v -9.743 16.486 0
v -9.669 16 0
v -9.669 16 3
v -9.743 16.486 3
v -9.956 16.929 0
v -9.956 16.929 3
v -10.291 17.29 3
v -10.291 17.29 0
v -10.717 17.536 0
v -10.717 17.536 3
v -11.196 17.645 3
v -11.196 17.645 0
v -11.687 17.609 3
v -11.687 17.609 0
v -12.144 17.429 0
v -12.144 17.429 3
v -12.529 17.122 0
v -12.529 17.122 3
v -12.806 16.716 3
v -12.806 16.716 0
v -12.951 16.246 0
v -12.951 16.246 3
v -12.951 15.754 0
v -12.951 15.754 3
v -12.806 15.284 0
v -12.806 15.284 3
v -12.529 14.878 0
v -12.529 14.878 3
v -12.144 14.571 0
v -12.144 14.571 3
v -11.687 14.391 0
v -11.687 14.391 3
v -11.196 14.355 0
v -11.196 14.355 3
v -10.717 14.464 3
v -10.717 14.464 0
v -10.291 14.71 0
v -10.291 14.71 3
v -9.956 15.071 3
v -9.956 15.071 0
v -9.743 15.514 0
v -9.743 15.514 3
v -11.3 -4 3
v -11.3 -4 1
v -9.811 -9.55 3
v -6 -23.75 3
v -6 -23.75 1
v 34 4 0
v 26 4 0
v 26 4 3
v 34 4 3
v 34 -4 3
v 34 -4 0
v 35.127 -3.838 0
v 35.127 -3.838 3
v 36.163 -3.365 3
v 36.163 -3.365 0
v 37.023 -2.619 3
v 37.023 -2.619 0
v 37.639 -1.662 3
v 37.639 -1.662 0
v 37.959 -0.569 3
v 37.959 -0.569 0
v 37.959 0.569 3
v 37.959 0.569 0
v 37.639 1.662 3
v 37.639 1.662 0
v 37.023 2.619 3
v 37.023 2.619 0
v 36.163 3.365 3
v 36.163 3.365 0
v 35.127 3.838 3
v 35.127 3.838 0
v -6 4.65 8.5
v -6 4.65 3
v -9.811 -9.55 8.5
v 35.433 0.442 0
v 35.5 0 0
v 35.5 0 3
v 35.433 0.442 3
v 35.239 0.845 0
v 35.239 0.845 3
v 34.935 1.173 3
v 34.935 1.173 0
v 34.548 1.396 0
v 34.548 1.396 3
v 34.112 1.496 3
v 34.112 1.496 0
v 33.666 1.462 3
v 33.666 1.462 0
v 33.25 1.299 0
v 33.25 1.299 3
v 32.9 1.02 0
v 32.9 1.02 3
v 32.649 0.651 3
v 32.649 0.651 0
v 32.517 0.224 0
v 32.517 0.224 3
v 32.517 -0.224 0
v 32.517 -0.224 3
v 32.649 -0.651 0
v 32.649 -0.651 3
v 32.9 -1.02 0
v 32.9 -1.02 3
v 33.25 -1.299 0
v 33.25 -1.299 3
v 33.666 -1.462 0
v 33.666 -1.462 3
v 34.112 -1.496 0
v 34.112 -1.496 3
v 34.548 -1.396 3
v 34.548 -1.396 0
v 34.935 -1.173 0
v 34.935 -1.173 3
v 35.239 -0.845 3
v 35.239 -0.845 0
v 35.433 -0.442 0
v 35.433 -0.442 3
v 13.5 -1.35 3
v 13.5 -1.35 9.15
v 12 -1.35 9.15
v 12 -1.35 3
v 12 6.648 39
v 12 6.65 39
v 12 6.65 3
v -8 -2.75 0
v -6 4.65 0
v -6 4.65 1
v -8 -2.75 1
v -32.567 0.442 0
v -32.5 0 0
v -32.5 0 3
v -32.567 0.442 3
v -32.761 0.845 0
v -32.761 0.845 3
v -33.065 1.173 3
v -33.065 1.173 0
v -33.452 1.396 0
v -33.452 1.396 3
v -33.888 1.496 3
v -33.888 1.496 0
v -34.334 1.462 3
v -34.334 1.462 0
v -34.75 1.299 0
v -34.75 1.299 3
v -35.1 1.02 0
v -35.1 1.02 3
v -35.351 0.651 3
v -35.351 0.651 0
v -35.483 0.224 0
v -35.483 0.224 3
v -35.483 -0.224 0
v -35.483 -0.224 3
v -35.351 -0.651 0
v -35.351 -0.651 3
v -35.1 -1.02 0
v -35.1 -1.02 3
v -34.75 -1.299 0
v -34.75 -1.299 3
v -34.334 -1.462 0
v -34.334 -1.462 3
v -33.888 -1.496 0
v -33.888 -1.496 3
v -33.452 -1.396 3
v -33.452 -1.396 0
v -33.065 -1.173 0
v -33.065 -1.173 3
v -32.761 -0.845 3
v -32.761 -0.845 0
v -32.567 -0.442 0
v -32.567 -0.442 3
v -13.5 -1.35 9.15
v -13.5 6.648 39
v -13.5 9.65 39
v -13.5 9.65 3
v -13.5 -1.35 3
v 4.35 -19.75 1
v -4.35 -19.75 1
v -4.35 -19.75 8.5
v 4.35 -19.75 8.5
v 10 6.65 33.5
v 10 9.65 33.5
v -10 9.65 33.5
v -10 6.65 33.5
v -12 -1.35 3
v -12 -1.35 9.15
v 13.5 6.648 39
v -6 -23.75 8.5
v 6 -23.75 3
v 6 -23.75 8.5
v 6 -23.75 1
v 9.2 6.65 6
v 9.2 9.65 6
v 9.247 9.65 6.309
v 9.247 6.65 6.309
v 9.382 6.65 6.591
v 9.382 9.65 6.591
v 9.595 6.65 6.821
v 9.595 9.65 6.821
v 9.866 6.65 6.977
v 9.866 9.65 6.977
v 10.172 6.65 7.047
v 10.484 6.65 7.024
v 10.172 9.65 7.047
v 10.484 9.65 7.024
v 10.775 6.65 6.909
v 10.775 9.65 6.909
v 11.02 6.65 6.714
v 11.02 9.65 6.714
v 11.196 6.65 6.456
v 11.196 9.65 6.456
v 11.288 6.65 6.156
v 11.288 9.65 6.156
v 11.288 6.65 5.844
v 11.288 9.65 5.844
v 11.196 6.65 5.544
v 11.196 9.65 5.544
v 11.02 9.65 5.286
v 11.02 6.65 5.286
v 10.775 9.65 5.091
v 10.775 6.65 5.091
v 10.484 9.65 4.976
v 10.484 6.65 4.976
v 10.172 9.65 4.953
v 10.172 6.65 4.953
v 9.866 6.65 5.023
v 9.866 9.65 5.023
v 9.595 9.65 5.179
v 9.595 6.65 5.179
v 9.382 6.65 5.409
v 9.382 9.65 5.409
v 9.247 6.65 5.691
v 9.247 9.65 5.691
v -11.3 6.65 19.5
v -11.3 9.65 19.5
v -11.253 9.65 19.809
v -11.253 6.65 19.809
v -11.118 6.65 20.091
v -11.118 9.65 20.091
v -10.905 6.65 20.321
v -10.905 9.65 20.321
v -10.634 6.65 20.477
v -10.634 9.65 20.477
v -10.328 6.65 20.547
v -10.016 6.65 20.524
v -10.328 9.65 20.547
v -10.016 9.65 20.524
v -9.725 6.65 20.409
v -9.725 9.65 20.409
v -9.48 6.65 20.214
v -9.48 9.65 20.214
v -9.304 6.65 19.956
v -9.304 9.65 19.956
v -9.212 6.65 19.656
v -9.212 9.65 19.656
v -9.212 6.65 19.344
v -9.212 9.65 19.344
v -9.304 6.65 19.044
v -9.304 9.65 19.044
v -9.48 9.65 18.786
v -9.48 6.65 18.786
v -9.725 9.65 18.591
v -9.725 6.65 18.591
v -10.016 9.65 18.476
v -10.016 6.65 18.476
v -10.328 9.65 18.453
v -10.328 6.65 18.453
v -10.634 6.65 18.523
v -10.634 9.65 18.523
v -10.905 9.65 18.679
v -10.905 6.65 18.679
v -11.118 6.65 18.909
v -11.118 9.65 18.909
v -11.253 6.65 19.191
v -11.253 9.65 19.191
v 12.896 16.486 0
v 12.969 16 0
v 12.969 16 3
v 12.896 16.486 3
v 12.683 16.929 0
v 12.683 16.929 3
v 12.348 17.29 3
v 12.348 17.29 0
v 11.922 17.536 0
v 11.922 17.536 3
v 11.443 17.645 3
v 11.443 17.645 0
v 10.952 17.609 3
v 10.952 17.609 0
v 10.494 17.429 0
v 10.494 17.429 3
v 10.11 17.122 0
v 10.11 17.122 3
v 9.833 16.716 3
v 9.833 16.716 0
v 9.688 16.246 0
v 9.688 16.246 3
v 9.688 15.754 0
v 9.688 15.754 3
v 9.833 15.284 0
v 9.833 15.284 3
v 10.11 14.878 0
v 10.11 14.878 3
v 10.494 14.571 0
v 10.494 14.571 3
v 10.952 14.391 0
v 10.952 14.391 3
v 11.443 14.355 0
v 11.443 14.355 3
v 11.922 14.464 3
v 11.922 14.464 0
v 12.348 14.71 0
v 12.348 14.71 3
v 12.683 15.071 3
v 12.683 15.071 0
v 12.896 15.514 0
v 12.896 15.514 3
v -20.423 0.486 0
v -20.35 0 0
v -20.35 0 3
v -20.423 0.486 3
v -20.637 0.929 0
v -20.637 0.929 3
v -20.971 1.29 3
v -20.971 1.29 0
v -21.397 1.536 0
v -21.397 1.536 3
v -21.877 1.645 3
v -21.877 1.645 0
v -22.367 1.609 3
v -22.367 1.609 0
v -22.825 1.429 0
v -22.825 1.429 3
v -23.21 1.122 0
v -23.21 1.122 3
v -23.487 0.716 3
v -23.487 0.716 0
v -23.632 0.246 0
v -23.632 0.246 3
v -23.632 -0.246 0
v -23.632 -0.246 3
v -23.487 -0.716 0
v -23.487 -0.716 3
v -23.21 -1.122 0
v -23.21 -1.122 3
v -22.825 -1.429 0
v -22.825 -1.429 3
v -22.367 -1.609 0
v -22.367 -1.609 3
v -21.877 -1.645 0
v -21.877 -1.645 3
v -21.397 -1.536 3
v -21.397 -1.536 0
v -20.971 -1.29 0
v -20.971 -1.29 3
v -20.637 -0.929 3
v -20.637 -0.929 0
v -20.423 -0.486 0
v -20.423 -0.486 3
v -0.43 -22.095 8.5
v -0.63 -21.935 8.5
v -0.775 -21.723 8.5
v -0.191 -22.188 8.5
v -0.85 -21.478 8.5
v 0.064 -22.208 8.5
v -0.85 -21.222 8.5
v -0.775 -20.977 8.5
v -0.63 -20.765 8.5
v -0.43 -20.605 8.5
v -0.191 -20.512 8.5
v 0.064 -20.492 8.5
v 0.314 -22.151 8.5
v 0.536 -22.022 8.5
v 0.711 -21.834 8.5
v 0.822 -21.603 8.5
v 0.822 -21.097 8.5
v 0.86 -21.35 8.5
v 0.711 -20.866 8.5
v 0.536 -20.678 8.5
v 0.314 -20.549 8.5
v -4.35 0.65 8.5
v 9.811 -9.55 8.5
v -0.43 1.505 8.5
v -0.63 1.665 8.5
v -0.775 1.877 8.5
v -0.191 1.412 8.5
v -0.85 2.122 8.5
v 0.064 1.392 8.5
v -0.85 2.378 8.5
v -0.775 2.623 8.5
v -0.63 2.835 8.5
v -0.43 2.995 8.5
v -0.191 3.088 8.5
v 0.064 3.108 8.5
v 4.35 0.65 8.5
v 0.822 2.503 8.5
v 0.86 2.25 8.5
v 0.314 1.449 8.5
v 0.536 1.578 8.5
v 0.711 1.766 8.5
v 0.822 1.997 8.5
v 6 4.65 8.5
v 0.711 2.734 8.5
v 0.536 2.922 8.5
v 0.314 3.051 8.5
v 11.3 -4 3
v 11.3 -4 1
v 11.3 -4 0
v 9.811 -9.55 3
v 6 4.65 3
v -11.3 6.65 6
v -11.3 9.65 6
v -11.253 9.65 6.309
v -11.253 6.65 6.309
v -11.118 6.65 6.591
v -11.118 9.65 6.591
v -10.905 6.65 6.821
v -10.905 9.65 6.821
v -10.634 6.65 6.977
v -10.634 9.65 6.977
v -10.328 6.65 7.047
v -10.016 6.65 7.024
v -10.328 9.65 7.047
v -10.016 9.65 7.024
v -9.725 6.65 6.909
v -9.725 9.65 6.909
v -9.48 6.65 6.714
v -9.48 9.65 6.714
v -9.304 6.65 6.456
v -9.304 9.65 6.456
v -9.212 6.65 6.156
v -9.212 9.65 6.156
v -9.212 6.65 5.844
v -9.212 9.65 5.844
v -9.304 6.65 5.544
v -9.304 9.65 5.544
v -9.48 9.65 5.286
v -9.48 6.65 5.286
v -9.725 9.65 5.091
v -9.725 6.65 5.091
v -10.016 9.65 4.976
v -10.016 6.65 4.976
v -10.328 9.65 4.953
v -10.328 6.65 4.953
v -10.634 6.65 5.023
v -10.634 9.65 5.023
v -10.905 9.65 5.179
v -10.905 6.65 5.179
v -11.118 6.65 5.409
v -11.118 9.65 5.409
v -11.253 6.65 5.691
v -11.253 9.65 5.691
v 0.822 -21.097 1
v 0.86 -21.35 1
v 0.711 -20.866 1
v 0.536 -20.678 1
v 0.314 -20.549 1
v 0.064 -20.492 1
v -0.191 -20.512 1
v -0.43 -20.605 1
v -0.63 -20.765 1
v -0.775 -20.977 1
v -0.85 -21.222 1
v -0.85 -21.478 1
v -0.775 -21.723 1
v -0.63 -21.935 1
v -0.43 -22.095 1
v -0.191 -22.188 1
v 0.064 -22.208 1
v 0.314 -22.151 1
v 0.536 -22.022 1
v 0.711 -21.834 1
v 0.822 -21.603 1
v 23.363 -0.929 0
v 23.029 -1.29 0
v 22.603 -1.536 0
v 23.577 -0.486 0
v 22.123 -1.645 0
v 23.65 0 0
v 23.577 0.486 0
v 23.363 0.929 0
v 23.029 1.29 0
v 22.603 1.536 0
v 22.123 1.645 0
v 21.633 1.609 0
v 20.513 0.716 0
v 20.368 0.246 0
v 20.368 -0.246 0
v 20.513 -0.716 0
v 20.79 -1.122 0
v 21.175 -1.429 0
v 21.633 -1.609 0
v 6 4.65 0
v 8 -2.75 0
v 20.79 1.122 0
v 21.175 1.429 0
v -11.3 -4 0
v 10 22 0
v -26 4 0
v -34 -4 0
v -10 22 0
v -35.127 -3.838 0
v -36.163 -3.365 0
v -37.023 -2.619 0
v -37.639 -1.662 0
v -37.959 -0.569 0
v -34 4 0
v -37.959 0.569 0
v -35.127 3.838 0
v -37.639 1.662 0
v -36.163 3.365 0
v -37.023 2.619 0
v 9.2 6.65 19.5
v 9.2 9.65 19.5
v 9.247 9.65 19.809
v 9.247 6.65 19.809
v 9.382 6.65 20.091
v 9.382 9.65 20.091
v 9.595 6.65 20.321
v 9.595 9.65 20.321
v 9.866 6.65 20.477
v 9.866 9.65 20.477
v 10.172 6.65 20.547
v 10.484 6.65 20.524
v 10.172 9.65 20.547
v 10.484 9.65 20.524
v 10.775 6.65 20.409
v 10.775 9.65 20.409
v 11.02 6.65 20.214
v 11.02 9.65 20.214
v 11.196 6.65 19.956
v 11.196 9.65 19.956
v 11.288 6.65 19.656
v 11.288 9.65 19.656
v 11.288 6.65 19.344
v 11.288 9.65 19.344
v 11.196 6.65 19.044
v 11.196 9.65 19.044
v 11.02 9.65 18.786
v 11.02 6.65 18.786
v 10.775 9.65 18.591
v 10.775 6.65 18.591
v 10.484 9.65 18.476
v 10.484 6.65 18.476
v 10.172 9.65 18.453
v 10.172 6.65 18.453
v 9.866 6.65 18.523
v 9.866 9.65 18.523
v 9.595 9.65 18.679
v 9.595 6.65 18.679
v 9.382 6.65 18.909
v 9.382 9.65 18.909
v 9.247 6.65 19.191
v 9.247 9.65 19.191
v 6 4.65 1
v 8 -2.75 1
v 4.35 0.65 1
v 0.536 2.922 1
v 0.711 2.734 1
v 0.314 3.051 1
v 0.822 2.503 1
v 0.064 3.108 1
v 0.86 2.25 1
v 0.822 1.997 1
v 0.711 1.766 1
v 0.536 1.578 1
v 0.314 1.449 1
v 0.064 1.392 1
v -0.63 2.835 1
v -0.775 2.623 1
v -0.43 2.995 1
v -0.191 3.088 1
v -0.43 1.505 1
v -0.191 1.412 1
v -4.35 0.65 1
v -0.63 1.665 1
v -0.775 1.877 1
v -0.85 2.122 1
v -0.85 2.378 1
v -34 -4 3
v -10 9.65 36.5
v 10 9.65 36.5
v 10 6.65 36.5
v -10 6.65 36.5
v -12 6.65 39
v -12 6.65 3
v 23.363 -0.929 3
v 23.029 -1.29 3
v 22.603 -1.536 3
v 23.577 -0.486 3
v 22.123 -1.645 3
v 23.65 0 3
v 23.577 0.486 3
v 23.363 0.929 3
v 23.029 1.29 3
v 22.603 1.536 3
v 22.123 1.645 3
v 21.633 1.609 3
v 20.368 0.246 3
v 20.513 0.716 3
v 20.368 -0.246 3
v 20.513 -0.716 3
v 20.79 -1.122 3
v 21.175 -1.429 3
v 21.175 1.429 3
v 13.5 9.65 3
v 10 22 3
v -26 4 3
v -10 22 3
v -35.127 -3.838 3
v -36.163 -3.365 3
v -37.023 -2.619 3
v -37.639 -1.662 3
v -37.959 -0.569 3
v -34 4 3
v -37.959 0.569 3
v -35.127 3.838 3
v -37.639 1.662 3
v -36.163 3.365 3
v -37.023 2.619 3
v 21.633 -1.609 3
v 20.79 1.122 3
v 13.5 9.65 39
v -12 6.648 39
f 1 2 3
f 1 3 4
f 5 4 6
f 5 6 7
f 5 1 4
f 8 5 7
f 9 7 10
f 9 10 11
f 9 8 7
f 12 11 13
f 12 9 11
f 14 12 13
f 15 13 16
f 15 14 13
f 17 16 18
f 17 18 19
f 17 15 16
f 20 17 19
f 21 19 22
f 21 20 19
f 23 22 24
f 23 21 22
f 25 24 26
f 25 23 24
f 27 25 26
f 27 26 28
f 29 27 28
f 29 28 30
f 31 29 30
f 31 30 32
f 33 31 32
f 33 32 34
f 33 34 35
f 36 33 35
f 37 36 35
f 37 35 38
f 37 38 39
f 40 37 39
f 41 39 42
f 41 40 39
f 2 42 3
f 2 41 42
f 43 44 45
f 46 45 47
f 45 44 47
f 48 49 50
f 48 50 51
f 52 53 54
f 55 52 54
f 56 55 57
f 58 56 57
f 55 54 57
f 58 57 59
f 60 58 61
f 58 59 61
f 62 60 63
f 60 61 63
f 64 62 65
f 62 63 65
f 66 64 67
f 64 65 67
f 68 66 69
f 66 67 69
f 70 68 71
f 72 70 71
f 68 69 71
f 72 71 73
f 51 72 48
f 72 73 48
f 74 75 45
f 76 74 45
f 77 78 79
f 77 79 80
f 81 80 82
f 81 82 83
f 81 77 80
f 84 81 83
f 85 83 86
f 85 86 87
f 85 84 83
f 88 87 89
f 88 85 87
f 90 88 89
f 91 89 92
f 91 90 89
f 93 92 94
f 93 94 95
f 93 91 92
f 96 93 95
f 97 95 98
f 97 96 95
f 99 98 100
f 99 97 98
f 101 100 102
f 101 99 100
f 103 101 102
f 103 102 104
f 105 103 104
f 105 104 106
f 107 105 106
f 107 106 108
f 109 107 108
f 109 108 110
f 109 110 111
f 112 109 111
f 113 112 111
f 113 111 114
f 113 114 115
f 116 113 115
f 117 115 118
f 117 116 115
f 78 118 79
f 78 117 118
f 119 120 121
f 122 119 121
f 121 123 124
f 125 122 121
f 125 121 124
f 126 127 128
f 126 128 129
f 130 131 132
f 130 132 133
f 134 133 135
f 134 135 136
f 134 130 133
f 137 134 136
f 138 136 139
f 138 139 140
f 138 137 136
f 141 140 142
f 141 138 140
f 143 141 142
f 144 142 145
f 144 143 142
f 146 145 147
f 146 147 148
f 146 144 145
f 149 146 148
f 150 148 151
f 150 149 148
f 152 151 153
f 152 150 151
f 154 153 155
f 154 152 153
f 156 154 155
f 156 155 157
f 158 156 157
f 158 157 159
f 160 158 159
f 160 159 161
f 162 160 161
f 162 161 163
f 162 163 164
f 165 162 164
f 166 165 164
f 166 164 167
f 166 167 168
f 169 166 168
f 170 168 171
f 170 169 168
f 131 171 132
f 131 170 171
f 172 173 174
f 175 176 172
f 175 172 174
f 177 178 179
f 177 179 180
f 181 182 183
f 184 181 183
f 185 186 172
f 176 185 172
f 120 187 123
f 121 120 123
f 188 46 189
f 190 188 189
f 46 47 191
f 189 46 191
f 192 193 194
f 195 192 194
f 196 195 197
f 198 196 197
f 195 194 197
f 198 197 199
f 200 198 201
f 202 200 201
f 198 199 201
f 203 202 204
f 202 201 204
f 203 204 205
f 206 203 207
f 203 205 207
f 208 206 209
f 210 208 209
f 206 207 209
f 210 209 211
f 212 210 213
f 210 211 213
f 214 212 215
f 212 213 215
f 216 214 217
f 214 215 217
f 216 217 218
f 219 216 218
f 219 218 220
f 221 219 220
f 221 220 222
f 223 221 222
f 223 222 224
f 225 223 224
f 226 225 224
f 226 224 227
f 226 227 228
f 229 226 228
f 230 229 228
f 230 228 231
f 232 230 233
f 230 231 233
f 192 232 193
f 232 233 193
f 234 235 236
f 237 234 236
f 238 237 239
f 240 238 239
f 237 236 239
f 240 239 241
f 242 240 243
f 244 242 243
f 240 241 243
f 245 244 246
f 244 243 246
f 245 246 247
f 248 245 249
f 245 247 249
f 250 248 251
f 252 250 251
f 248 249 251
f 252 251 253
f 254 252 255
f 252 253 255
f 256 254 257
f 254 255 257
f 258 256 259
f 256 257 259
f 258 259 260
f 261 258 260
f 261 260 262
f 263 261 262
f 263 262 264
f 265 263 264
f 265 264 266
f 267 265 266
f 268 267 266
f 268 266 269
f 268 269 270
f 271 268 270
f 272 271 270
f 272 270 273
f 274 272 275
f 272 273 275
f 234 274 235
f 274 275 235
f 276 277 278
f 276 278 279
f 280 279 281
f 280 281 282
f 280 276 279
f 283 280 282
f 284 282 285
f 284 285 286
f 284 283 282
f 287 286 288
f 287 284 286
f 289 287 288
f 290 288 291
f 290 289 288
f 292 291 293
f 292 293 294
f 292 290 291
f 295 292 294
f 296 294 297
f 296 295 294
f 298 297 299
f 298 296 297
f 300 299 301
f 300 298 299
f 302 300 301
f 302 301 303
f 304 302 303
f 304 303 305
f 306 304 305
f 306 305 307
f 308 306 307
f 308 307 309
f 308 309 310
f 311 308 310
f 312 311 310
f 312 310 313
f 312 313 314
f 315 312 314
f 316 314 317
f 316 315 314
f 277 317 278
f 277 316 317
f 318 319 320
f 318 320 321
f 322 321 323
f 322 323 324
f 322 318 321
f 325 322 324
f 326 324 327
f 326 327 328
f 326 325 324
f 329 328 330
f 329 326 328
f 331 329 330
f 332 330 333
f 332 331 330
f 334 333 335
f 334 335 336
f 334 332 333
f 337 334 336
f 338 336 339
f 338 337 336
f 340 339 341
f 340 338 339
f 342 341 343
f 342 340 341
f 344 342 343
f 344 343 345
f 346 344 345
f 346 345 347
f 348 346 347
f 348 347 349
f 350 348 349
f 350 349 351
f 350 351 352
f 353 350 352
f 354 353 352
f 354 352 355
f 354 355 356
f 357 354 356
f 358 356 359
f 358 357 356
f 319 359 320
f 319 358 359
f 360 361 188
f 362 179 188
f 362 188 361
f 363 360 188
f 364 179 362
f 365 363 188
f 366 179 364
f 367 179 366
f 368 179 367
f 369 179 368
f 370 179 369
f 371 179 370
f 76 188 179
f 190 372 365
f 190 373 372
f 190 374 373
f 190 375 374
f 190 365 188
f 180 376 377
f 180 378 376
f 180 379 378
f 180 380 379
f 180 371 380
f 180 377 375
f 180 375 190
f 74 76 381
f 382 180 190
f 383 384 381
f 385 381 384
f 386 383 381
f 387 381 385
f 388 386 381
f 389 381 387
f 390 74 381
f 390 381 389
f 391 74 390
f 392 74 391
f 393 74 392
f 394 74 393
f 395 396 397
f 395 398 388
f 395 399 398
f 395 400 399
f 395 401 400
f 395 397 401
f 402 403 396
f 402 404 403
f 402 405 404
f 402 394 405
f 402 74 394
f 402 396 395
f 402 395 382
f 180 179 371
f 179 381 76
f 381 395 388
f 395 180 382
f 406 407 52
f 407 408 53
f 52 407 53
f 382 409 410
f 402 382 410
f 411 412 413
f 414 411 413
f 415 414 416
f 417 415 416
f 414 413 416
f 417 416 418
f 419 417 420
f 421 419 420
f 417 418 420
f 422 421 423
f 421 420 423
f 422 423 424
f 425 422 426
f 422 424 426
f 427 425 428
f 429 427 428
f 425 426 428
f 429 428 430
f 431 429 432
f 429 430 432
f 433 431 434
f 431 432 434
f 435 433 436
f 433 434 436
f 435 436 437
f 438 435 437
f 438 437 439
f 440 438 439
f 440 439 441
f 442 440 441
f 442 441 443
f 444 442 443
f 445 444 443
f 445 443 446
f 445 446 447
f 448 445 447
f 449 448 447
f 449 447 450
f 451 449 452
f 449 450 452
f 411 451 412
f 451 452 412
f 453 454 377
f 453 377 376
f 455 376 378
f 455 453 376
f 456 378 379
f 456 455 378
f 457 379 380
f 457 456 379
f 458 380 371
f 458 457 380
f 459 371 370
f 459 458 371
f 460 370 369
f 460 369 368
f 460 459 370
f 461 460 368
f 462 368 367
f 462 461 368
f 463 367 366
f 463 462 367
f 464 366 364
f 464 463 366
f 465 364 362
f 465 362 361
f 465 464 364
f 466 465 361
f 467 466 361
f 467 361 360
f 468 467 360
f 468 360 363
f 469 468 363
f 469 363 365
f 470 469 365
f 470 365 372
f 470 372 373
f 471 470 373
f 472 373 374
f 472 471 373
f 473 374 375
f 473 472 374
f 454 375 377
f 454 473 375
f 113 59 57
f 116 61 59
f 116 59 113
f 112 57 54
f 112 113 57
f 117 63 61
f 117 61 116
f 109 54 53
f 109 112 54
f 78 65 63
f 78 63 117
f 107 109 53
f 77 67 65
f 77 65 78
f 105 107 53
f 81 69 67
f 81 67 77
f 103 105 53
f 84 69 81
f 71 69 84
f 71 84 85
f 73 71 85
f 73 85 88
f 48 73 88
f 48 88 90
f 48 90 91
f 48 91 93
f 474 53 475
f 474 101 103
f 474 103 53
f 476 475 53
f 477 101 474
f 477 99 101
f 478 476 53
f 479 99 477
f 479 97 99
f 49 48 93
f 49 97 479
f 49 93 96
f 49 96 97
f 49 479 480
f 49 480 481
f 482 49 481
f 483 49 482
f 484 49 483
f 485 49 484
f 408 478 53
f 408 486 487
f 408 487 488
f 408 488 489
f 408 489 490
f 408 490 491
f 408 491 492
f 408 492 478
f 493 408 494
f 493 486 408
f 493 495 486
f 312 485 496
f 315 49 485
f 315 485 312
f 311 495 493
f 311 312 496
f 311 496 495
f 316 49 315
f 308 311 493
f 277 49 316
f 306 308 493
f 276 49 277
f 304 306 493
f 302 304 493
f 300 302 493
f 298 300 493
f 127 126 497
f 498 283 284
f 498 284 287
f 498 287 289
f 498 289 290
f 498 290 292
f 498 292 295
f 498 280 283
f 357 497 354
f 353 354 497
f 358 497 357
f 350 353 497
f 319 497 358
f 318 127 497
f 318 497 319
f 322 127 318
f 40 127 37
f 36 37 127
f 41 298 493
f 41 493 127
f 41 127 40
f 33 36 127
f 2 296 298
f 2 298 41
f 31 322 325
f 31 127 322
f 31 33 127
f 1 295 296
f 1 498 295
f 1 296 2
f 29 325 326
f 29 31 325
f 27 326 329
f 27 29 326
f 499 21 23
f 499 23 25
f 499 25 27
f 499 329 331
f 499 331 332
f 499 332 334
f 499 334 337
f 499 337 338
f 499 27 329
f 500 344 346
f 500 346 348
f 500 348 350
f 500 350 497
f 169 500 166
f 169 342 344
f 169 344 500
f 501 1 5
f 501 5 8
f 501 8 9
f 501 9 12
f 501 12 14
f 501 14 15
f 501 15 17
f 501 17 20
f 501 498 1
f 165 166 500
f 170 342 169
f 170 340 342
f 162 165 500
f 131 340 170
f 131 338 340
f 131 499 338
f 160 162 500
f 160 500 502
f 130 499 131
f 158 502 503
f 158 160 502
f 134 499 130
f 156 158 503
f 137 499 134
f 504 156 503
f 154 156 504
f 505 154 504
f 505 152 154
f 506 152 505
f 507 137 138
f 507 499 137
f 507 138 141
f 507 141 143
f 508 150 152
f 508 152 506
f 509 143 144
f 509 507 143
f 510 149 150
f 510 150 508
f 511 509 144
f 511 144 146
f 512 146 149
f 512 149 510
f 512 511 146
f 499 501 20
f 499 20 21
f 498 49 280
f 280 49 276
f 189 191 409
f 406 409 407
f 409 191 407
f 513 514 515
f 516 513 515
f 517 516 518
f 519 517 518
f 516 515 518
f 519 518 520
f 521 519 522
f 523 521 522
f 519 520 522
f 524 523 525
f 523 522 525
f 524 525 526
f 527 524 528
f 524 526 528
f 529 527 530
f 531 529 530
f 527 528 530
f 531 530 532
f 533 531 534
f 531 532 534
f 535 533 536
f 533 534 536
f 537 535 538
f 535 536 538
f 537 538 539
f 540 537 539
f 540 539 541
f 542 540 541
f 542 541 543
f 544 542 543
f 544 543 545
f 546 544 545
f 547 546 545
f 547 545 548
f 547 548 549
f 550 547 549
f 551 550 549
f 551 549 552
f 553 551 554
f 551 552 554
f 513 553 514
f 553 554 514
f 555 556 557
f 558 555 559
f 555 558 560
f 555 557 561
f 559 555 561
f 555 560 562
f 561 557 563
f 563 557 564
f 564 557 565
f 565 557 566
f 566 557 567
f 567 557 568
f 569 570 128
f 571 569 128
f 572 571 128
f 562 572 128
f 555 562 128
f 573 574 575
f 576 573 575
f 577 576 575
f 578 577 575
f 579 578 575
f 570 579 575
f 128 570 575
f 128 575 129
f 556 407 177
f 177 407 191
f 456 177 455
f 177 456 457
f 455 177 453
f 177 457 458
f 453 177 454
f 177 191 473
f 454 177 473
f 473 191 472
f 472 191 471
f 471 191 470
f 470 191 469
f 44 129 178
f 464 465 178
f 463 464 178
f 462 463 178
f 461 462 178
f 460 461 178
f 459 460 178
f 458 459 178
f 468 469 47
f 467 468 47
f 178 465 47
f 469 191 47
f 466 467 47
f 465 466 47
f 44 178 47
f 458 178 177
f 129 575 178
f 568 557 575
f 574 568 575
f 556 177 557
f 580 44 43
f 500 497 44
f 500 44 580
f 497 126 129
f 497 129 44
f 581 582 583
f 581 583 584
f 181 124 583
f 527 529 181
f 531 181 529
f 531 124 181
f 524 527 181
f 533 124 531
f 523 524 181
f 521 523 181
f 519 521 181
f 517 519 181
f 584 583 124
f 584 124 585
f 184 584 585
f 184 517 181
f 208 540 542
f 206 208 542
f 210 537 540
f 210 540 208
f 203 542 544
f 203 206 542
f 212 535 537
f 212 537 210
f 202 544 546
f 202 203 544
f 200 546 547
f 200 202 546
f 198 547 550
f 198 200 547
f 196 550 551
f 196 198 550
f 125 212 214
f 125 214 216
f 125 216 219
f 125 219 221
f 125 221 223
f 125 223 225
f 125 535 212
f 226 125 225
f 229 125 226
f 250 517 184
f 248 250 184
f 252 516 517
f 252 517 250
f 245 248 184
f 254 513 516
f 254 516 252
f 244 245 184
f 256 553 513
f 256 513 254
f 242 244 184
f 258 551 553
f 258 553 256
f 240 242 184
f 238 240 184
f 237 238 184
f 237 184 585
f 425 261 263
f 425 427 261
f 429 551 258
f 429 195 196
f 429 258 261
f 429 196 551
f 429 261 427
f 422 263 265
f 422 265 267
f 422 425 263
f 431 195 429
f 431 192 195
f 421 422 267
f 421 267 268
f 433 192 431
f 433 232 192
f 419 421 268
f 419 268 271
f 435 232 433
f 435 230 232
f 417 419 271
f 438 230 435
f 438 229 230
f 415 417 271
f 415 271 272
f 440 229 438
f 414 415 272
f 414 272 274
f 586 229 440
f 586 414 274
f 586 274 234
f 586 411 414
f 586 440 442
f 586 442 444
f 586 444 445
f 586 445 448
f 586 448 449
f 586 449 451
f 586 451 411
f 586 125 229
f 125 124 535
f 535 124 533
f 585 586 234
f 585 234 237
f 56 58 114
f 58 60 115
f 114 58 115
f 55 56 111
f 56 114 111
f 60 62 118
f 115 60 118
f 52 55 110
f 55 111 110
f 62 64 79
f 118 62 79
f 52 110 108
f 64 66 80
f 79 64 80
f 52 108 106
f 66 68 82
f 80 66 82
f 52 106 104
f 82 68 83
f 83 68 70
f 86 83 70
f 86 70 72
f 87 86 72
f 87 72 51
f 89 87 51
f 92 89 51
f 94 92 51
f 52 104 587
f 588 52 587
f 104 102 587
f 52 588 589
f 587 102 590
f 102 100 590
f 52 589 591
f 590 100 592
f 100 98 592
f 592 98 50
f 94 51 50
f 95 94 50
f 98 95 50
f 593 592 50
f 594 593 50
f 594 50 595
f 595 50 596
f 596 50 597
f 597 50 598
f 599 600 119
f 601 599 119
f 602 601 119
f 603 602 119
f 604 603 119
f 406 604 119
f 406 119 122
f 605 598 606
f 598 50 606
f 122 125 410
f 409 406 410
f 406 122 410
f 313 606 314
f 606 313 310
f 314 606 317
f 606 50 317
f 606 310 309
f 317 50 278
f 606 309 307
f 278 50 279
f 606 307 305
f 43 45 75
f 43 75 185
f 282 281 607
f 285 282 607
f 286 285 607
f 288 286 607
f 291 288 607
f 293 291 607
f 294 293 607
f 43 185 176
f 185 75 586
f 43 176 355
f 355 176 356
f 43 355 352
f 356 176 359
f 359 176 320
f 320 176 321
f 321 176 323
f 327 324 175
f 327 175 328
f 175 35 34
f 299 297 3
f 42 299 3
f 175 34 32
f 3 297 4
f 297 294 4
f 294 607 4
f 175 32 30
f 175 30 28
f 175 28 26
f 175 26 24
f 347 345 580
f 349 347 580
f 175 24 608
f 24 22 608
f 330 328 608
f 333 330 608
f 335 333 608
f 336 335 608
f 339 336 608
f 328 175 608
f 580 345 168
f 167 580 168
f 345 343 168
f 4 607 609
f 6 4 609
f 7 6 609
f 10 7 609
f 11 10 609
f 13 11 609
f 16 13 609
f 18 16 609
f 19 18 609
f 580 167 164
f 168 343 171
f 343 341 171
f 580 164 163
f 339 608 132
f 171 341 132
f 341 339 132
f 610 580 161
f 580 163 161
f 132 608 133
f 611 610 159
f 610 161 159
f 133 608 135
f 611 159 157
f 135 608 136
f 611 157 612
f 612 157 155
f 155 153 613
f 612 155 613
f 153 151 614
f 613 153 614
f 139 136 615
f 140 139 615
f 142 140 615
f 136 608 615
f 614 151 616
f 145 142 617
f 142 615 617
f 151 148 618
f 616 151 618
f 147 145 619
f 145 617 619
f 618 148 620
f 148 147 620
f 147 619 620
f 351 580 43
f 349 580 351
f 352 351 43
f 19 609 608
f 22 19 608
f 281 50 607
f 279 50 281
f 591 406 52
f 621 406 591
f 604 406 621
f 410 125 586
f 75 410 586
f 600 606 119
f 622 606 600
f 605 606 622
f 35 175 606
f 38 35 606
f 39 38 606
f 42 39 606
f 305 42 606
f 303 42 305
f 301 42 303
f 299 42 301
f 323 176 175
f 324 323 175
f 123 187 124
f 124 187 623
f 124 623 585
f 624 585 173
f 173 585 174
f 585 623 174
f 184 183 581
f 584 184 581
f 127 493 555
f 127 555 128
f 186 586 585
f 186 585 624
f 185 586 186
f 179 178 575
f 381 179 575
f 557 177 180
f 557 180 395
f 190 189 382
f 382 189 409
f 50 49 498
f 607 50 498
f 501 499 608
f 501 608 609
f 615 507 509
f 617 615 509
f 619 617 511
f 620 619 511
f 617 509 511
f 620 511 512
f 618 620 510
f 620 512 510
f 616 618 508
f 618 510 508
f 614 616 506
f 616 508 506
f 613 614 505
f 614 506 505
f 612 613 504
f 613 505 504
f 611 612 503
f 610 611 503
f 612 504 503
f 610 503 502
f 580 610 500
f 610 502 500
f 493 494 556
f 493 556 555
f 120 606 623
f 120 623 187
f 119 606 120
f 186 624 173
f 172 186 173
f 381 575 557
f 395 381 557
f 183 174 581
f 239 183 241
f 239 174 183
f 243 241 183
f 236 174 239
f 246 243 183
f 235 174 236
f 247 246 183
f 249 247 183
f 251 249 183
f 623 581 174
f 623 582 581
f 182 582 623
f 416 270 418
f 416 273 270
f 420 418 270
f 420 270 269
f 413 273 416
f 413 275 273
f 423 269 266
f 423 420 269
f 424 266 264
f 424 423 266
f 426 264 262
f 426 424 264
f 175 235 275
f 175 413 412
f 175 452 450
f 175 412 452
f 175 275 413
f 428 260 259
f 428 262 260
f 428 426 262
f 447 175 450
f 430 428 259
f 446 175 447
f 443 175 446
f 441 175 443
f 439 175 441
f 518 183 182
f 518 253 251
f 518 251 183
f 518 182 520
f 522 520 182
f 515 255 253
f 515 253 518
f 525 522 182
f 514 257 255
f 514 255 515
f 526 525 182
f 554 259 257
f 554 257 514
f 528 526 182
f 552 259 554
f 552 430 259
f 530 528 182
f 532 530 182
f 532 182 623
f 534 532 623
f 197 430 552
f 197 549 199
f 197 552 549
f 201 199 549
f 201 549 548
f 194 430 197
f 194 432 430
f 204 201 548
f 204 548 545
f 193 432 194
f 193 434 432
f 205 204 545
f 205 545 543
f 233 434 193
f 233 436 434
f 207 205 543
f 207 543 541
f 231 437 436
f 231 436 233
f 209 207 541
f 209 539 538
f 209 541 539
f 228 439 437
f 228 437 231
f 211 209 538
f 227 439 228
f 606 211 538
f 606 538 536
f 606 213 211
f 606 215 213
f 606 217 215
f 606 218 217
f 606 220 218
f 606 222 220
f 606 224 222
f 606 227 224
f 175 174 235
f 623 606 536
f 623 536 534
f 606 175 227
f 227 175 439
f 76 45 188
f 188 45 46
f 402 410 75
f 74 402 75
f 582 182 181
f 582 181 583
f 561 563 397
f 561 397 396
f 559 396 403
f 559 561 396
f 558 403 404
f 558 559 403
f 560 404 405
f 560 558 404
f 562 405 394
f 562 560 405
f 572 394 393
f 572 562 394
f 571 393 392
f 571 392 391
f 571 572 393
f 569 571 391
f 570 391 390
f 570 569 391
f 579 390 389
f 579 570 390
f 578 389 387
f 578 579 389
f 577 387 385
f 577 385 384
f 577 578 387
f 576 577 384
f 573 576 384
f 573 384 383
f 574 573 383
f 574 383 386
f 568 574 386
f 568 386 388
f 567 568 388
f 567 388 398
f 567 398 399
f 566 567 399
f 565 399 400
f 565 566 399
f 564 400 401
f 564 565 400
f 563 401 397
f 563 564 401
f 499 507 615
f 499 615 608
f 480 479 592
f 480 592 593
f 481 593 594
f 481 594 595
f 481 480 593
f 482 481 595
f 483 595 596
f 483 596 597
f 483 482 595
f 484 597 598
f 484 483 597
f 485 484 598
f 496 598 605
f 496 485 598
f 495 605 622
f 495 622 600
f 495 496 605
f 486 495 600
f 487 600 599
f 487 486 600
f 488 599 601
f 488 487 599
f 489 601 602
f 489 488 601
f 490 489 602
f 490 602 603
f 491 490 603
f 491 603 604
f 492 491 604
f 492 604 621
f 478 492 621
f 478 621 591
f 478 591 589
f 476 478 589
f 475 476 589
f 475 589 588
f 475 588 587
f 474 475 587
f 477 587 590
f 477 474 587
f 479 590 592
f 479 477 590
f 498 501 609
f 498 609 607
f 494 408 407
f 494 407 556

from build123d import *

# Parameters (mm, degrees)
SKETCH_R        = 0.86
SKETCH_R_2      = 1.5
SKETCH_R_3      = 1.65
SKETCH_W        = 8.7
SKETCH_H        = 20.4
PAD_DEPTH       = 3
SKETCH001_R     = 0.86
SKETCH001_W     = 8.7
SKETCH001_H     = 20.4
PAD001_DEPTH    = 5.5
PAD002_DEPTH    = 36
CHAMFER_1_ANGLE = 15
CHAMFER_1_SIZE  = 29.85
CHAMFER_2_ANGLE = 15
CHAMFER_2_SIZE  = 29.85
SKETCH003_R     = 1.05
SKETCH003_W     = 20
SKETCH003_H     = 3
POCKET_DEPTH    = 3
POCKET001_DEPTH = 1


with BuildPart() as part:
    # Sketch → Pad (new body)
    with BuildSketch(Plane.XY):
        with BuildLine():
            Line((-11.3, -4), (-26, -4))
            Line((-26, -4), (-34, -4))
            ThreePointArc((-34, 4), (-38, 0), (-34, -4))
            Line((-34, 4), (-26, 4))
            Line((-26, 4), (-10, 22))
            Line((-10, 22), (10, 22))
            Line((26, 4), (10, 22))
            Line((26, 4), (34, 4))
            ThreePointArc((34, -4), (38, 0), (34, 4))
            Line((26, -4), (34, -4))
            Line((11.3, -4), (26, -4))
            Line((6, -23.75), (11.3, -4))
            Line((-6, -23.75), (6, -23.75))
            Line((-11.3, -4), (-6, -23.75))
        make_face()
        with Locations((0, 2.25)):
            Circle(SKETCH_R, mode=Mode.SUBTRACT)
        with Locations((0, -21.35)):
            Circle(SKETCH_R, mode=Mode.SUBTRACT)
        with Locations((-34, 0)):
            Circle(SKETCH_R_2, mode=Mode.SUBTRACT)
        with Locations((34, 0)):
            Circle(SKETCH_R_2, mode=Mode.SUBTRACT)
        with Locations((-22, 0)):
            Circle(SKETCH_R_3, mode=Mode.SUBTRACT)
        with Locations((-11.319468, 16)):
            Circle(SKETCH_R_3, mode=Mode.SUBTRACT)
        with Locations((11.319468, 16)):
            Circle(SKETCH_R_3, mode=Mode.SUBTRACT)
        with Locations((22, 0)):
            Circle(SKETCH_R_3, mode=Mode.SUBTRACT)
        with Locations((0, -9.55)):
            Rectangle(SKETCH_W, SKETCH_H, mode=Mode.SUBTRACT)
    extrude(amount=PAD_DEPTH)

    # Sketch001 (on Face24 of Pad) → Pad001 (join)
    with BuildSketch(Plane.XY.offset(3)):
        Polygon((-6, -23.75), (6, -23.75), (9.810633, -9.55), (6, 4.65), (-6, 4.65), (-9.810633, -9.55), align=None)
        with Locations((0, -21.35)):
            Circle(SKETCH001_R, mode=Mode.SUBTRACT)
        with Locations((0, 2.25)):
            Circle(SKETCH001_R, mode=Mode.SUBTRACT)
        with Locations((0, -9.55)):
            Rectangle(SKETCH001_W, SKETCH001_H, mode=Mode.SUBTRACT)
    extrude(amount=PAD001_DEPTH)

    # Sketch002 (on Face5 of Pad001) → Pad002 (join)
    with BuildSketch(Plane.XY.offset(3)):
        Polygon((-12, 6.65), (-12, -1.35), (-13.5, -1.35), (-13.5, 9.65), (13.5, 9.65), (13.5, -1.35), (12, -1.35), (12, 6.65), align=None)
    extrude(amount=PAD002_DEPTH)

    # Chamfer 1
    chamfer_1_edges = [part.edges().sort_by_distance(p)[0] for p in [
        (-12.75, -1.35, 39),
    ]]
    chamfer_1_side = part.faces().sort_by_distance((-12.75, -1.35, 21))[0]
    chamfer(chamfer_1_edges, length=CHAMFER_1_SIZE, angle=CHAMFER_1_ANGLE, reference=chamfer_1_side)

    # Chamfer 2
    chamfer_2_edges = [part.edges().sort_by_distance(p)[0] for p in [
        (12.75, -1.35, 39),
    ]]
    chamfer_2_side = part.faces().sort_by_distance((12.75, -1.35, 21))[0]
    chamfer(chamfer_2_edges, length=CHAMFER_2_SIZE, angle=CHAMFER_2_ANGLE, reference=chamfer_2_side)

    # Sketch003 (on Face26 of Chamfer) → Pocket (cut)
    with BuildSketch(Plane(origin=(0, 9.65, 0), x_dir=(-1, 0, 0), z_dir=(0, 1, 0))):
        with Locations((-10.25, 6)):
            Circle(SKETCH003_R)
        with Locations((-10.25, 19.5)):
            Circle(SKETCH003_R)
        with Locations((10.25, 6)):
            Circle(SKETCH003_R)
        with Locations((10.25, 19.5)):
            Circle(SKETCH003_R)
        with Locations((0, 35)):
            Rectangle(SKETCH003_W, SKETCH003_H)
    extrude(amount=-POCKET_DEPTH, mode=Mode.SUBTRACT)

    # Sketch004 (on Face41 of Pocket) → Pocket001 (cut)
    with BuildSketch(Plane(origin=(0, 0, 0), x_dir=(1, 0, 0), z_dir=(0, 0, -1))):
        Polygon((-8, 2.75), (-11.3, 4), (-6, 23.75), (6, 23.75), (11.3, 4), (8, 2.75), (6, -4.65), (-6, -4.65), align=None)
    extrude(amount=-POCKET001_DEPTH, mode=Mode.SUBTRACT)


solid = part.part
